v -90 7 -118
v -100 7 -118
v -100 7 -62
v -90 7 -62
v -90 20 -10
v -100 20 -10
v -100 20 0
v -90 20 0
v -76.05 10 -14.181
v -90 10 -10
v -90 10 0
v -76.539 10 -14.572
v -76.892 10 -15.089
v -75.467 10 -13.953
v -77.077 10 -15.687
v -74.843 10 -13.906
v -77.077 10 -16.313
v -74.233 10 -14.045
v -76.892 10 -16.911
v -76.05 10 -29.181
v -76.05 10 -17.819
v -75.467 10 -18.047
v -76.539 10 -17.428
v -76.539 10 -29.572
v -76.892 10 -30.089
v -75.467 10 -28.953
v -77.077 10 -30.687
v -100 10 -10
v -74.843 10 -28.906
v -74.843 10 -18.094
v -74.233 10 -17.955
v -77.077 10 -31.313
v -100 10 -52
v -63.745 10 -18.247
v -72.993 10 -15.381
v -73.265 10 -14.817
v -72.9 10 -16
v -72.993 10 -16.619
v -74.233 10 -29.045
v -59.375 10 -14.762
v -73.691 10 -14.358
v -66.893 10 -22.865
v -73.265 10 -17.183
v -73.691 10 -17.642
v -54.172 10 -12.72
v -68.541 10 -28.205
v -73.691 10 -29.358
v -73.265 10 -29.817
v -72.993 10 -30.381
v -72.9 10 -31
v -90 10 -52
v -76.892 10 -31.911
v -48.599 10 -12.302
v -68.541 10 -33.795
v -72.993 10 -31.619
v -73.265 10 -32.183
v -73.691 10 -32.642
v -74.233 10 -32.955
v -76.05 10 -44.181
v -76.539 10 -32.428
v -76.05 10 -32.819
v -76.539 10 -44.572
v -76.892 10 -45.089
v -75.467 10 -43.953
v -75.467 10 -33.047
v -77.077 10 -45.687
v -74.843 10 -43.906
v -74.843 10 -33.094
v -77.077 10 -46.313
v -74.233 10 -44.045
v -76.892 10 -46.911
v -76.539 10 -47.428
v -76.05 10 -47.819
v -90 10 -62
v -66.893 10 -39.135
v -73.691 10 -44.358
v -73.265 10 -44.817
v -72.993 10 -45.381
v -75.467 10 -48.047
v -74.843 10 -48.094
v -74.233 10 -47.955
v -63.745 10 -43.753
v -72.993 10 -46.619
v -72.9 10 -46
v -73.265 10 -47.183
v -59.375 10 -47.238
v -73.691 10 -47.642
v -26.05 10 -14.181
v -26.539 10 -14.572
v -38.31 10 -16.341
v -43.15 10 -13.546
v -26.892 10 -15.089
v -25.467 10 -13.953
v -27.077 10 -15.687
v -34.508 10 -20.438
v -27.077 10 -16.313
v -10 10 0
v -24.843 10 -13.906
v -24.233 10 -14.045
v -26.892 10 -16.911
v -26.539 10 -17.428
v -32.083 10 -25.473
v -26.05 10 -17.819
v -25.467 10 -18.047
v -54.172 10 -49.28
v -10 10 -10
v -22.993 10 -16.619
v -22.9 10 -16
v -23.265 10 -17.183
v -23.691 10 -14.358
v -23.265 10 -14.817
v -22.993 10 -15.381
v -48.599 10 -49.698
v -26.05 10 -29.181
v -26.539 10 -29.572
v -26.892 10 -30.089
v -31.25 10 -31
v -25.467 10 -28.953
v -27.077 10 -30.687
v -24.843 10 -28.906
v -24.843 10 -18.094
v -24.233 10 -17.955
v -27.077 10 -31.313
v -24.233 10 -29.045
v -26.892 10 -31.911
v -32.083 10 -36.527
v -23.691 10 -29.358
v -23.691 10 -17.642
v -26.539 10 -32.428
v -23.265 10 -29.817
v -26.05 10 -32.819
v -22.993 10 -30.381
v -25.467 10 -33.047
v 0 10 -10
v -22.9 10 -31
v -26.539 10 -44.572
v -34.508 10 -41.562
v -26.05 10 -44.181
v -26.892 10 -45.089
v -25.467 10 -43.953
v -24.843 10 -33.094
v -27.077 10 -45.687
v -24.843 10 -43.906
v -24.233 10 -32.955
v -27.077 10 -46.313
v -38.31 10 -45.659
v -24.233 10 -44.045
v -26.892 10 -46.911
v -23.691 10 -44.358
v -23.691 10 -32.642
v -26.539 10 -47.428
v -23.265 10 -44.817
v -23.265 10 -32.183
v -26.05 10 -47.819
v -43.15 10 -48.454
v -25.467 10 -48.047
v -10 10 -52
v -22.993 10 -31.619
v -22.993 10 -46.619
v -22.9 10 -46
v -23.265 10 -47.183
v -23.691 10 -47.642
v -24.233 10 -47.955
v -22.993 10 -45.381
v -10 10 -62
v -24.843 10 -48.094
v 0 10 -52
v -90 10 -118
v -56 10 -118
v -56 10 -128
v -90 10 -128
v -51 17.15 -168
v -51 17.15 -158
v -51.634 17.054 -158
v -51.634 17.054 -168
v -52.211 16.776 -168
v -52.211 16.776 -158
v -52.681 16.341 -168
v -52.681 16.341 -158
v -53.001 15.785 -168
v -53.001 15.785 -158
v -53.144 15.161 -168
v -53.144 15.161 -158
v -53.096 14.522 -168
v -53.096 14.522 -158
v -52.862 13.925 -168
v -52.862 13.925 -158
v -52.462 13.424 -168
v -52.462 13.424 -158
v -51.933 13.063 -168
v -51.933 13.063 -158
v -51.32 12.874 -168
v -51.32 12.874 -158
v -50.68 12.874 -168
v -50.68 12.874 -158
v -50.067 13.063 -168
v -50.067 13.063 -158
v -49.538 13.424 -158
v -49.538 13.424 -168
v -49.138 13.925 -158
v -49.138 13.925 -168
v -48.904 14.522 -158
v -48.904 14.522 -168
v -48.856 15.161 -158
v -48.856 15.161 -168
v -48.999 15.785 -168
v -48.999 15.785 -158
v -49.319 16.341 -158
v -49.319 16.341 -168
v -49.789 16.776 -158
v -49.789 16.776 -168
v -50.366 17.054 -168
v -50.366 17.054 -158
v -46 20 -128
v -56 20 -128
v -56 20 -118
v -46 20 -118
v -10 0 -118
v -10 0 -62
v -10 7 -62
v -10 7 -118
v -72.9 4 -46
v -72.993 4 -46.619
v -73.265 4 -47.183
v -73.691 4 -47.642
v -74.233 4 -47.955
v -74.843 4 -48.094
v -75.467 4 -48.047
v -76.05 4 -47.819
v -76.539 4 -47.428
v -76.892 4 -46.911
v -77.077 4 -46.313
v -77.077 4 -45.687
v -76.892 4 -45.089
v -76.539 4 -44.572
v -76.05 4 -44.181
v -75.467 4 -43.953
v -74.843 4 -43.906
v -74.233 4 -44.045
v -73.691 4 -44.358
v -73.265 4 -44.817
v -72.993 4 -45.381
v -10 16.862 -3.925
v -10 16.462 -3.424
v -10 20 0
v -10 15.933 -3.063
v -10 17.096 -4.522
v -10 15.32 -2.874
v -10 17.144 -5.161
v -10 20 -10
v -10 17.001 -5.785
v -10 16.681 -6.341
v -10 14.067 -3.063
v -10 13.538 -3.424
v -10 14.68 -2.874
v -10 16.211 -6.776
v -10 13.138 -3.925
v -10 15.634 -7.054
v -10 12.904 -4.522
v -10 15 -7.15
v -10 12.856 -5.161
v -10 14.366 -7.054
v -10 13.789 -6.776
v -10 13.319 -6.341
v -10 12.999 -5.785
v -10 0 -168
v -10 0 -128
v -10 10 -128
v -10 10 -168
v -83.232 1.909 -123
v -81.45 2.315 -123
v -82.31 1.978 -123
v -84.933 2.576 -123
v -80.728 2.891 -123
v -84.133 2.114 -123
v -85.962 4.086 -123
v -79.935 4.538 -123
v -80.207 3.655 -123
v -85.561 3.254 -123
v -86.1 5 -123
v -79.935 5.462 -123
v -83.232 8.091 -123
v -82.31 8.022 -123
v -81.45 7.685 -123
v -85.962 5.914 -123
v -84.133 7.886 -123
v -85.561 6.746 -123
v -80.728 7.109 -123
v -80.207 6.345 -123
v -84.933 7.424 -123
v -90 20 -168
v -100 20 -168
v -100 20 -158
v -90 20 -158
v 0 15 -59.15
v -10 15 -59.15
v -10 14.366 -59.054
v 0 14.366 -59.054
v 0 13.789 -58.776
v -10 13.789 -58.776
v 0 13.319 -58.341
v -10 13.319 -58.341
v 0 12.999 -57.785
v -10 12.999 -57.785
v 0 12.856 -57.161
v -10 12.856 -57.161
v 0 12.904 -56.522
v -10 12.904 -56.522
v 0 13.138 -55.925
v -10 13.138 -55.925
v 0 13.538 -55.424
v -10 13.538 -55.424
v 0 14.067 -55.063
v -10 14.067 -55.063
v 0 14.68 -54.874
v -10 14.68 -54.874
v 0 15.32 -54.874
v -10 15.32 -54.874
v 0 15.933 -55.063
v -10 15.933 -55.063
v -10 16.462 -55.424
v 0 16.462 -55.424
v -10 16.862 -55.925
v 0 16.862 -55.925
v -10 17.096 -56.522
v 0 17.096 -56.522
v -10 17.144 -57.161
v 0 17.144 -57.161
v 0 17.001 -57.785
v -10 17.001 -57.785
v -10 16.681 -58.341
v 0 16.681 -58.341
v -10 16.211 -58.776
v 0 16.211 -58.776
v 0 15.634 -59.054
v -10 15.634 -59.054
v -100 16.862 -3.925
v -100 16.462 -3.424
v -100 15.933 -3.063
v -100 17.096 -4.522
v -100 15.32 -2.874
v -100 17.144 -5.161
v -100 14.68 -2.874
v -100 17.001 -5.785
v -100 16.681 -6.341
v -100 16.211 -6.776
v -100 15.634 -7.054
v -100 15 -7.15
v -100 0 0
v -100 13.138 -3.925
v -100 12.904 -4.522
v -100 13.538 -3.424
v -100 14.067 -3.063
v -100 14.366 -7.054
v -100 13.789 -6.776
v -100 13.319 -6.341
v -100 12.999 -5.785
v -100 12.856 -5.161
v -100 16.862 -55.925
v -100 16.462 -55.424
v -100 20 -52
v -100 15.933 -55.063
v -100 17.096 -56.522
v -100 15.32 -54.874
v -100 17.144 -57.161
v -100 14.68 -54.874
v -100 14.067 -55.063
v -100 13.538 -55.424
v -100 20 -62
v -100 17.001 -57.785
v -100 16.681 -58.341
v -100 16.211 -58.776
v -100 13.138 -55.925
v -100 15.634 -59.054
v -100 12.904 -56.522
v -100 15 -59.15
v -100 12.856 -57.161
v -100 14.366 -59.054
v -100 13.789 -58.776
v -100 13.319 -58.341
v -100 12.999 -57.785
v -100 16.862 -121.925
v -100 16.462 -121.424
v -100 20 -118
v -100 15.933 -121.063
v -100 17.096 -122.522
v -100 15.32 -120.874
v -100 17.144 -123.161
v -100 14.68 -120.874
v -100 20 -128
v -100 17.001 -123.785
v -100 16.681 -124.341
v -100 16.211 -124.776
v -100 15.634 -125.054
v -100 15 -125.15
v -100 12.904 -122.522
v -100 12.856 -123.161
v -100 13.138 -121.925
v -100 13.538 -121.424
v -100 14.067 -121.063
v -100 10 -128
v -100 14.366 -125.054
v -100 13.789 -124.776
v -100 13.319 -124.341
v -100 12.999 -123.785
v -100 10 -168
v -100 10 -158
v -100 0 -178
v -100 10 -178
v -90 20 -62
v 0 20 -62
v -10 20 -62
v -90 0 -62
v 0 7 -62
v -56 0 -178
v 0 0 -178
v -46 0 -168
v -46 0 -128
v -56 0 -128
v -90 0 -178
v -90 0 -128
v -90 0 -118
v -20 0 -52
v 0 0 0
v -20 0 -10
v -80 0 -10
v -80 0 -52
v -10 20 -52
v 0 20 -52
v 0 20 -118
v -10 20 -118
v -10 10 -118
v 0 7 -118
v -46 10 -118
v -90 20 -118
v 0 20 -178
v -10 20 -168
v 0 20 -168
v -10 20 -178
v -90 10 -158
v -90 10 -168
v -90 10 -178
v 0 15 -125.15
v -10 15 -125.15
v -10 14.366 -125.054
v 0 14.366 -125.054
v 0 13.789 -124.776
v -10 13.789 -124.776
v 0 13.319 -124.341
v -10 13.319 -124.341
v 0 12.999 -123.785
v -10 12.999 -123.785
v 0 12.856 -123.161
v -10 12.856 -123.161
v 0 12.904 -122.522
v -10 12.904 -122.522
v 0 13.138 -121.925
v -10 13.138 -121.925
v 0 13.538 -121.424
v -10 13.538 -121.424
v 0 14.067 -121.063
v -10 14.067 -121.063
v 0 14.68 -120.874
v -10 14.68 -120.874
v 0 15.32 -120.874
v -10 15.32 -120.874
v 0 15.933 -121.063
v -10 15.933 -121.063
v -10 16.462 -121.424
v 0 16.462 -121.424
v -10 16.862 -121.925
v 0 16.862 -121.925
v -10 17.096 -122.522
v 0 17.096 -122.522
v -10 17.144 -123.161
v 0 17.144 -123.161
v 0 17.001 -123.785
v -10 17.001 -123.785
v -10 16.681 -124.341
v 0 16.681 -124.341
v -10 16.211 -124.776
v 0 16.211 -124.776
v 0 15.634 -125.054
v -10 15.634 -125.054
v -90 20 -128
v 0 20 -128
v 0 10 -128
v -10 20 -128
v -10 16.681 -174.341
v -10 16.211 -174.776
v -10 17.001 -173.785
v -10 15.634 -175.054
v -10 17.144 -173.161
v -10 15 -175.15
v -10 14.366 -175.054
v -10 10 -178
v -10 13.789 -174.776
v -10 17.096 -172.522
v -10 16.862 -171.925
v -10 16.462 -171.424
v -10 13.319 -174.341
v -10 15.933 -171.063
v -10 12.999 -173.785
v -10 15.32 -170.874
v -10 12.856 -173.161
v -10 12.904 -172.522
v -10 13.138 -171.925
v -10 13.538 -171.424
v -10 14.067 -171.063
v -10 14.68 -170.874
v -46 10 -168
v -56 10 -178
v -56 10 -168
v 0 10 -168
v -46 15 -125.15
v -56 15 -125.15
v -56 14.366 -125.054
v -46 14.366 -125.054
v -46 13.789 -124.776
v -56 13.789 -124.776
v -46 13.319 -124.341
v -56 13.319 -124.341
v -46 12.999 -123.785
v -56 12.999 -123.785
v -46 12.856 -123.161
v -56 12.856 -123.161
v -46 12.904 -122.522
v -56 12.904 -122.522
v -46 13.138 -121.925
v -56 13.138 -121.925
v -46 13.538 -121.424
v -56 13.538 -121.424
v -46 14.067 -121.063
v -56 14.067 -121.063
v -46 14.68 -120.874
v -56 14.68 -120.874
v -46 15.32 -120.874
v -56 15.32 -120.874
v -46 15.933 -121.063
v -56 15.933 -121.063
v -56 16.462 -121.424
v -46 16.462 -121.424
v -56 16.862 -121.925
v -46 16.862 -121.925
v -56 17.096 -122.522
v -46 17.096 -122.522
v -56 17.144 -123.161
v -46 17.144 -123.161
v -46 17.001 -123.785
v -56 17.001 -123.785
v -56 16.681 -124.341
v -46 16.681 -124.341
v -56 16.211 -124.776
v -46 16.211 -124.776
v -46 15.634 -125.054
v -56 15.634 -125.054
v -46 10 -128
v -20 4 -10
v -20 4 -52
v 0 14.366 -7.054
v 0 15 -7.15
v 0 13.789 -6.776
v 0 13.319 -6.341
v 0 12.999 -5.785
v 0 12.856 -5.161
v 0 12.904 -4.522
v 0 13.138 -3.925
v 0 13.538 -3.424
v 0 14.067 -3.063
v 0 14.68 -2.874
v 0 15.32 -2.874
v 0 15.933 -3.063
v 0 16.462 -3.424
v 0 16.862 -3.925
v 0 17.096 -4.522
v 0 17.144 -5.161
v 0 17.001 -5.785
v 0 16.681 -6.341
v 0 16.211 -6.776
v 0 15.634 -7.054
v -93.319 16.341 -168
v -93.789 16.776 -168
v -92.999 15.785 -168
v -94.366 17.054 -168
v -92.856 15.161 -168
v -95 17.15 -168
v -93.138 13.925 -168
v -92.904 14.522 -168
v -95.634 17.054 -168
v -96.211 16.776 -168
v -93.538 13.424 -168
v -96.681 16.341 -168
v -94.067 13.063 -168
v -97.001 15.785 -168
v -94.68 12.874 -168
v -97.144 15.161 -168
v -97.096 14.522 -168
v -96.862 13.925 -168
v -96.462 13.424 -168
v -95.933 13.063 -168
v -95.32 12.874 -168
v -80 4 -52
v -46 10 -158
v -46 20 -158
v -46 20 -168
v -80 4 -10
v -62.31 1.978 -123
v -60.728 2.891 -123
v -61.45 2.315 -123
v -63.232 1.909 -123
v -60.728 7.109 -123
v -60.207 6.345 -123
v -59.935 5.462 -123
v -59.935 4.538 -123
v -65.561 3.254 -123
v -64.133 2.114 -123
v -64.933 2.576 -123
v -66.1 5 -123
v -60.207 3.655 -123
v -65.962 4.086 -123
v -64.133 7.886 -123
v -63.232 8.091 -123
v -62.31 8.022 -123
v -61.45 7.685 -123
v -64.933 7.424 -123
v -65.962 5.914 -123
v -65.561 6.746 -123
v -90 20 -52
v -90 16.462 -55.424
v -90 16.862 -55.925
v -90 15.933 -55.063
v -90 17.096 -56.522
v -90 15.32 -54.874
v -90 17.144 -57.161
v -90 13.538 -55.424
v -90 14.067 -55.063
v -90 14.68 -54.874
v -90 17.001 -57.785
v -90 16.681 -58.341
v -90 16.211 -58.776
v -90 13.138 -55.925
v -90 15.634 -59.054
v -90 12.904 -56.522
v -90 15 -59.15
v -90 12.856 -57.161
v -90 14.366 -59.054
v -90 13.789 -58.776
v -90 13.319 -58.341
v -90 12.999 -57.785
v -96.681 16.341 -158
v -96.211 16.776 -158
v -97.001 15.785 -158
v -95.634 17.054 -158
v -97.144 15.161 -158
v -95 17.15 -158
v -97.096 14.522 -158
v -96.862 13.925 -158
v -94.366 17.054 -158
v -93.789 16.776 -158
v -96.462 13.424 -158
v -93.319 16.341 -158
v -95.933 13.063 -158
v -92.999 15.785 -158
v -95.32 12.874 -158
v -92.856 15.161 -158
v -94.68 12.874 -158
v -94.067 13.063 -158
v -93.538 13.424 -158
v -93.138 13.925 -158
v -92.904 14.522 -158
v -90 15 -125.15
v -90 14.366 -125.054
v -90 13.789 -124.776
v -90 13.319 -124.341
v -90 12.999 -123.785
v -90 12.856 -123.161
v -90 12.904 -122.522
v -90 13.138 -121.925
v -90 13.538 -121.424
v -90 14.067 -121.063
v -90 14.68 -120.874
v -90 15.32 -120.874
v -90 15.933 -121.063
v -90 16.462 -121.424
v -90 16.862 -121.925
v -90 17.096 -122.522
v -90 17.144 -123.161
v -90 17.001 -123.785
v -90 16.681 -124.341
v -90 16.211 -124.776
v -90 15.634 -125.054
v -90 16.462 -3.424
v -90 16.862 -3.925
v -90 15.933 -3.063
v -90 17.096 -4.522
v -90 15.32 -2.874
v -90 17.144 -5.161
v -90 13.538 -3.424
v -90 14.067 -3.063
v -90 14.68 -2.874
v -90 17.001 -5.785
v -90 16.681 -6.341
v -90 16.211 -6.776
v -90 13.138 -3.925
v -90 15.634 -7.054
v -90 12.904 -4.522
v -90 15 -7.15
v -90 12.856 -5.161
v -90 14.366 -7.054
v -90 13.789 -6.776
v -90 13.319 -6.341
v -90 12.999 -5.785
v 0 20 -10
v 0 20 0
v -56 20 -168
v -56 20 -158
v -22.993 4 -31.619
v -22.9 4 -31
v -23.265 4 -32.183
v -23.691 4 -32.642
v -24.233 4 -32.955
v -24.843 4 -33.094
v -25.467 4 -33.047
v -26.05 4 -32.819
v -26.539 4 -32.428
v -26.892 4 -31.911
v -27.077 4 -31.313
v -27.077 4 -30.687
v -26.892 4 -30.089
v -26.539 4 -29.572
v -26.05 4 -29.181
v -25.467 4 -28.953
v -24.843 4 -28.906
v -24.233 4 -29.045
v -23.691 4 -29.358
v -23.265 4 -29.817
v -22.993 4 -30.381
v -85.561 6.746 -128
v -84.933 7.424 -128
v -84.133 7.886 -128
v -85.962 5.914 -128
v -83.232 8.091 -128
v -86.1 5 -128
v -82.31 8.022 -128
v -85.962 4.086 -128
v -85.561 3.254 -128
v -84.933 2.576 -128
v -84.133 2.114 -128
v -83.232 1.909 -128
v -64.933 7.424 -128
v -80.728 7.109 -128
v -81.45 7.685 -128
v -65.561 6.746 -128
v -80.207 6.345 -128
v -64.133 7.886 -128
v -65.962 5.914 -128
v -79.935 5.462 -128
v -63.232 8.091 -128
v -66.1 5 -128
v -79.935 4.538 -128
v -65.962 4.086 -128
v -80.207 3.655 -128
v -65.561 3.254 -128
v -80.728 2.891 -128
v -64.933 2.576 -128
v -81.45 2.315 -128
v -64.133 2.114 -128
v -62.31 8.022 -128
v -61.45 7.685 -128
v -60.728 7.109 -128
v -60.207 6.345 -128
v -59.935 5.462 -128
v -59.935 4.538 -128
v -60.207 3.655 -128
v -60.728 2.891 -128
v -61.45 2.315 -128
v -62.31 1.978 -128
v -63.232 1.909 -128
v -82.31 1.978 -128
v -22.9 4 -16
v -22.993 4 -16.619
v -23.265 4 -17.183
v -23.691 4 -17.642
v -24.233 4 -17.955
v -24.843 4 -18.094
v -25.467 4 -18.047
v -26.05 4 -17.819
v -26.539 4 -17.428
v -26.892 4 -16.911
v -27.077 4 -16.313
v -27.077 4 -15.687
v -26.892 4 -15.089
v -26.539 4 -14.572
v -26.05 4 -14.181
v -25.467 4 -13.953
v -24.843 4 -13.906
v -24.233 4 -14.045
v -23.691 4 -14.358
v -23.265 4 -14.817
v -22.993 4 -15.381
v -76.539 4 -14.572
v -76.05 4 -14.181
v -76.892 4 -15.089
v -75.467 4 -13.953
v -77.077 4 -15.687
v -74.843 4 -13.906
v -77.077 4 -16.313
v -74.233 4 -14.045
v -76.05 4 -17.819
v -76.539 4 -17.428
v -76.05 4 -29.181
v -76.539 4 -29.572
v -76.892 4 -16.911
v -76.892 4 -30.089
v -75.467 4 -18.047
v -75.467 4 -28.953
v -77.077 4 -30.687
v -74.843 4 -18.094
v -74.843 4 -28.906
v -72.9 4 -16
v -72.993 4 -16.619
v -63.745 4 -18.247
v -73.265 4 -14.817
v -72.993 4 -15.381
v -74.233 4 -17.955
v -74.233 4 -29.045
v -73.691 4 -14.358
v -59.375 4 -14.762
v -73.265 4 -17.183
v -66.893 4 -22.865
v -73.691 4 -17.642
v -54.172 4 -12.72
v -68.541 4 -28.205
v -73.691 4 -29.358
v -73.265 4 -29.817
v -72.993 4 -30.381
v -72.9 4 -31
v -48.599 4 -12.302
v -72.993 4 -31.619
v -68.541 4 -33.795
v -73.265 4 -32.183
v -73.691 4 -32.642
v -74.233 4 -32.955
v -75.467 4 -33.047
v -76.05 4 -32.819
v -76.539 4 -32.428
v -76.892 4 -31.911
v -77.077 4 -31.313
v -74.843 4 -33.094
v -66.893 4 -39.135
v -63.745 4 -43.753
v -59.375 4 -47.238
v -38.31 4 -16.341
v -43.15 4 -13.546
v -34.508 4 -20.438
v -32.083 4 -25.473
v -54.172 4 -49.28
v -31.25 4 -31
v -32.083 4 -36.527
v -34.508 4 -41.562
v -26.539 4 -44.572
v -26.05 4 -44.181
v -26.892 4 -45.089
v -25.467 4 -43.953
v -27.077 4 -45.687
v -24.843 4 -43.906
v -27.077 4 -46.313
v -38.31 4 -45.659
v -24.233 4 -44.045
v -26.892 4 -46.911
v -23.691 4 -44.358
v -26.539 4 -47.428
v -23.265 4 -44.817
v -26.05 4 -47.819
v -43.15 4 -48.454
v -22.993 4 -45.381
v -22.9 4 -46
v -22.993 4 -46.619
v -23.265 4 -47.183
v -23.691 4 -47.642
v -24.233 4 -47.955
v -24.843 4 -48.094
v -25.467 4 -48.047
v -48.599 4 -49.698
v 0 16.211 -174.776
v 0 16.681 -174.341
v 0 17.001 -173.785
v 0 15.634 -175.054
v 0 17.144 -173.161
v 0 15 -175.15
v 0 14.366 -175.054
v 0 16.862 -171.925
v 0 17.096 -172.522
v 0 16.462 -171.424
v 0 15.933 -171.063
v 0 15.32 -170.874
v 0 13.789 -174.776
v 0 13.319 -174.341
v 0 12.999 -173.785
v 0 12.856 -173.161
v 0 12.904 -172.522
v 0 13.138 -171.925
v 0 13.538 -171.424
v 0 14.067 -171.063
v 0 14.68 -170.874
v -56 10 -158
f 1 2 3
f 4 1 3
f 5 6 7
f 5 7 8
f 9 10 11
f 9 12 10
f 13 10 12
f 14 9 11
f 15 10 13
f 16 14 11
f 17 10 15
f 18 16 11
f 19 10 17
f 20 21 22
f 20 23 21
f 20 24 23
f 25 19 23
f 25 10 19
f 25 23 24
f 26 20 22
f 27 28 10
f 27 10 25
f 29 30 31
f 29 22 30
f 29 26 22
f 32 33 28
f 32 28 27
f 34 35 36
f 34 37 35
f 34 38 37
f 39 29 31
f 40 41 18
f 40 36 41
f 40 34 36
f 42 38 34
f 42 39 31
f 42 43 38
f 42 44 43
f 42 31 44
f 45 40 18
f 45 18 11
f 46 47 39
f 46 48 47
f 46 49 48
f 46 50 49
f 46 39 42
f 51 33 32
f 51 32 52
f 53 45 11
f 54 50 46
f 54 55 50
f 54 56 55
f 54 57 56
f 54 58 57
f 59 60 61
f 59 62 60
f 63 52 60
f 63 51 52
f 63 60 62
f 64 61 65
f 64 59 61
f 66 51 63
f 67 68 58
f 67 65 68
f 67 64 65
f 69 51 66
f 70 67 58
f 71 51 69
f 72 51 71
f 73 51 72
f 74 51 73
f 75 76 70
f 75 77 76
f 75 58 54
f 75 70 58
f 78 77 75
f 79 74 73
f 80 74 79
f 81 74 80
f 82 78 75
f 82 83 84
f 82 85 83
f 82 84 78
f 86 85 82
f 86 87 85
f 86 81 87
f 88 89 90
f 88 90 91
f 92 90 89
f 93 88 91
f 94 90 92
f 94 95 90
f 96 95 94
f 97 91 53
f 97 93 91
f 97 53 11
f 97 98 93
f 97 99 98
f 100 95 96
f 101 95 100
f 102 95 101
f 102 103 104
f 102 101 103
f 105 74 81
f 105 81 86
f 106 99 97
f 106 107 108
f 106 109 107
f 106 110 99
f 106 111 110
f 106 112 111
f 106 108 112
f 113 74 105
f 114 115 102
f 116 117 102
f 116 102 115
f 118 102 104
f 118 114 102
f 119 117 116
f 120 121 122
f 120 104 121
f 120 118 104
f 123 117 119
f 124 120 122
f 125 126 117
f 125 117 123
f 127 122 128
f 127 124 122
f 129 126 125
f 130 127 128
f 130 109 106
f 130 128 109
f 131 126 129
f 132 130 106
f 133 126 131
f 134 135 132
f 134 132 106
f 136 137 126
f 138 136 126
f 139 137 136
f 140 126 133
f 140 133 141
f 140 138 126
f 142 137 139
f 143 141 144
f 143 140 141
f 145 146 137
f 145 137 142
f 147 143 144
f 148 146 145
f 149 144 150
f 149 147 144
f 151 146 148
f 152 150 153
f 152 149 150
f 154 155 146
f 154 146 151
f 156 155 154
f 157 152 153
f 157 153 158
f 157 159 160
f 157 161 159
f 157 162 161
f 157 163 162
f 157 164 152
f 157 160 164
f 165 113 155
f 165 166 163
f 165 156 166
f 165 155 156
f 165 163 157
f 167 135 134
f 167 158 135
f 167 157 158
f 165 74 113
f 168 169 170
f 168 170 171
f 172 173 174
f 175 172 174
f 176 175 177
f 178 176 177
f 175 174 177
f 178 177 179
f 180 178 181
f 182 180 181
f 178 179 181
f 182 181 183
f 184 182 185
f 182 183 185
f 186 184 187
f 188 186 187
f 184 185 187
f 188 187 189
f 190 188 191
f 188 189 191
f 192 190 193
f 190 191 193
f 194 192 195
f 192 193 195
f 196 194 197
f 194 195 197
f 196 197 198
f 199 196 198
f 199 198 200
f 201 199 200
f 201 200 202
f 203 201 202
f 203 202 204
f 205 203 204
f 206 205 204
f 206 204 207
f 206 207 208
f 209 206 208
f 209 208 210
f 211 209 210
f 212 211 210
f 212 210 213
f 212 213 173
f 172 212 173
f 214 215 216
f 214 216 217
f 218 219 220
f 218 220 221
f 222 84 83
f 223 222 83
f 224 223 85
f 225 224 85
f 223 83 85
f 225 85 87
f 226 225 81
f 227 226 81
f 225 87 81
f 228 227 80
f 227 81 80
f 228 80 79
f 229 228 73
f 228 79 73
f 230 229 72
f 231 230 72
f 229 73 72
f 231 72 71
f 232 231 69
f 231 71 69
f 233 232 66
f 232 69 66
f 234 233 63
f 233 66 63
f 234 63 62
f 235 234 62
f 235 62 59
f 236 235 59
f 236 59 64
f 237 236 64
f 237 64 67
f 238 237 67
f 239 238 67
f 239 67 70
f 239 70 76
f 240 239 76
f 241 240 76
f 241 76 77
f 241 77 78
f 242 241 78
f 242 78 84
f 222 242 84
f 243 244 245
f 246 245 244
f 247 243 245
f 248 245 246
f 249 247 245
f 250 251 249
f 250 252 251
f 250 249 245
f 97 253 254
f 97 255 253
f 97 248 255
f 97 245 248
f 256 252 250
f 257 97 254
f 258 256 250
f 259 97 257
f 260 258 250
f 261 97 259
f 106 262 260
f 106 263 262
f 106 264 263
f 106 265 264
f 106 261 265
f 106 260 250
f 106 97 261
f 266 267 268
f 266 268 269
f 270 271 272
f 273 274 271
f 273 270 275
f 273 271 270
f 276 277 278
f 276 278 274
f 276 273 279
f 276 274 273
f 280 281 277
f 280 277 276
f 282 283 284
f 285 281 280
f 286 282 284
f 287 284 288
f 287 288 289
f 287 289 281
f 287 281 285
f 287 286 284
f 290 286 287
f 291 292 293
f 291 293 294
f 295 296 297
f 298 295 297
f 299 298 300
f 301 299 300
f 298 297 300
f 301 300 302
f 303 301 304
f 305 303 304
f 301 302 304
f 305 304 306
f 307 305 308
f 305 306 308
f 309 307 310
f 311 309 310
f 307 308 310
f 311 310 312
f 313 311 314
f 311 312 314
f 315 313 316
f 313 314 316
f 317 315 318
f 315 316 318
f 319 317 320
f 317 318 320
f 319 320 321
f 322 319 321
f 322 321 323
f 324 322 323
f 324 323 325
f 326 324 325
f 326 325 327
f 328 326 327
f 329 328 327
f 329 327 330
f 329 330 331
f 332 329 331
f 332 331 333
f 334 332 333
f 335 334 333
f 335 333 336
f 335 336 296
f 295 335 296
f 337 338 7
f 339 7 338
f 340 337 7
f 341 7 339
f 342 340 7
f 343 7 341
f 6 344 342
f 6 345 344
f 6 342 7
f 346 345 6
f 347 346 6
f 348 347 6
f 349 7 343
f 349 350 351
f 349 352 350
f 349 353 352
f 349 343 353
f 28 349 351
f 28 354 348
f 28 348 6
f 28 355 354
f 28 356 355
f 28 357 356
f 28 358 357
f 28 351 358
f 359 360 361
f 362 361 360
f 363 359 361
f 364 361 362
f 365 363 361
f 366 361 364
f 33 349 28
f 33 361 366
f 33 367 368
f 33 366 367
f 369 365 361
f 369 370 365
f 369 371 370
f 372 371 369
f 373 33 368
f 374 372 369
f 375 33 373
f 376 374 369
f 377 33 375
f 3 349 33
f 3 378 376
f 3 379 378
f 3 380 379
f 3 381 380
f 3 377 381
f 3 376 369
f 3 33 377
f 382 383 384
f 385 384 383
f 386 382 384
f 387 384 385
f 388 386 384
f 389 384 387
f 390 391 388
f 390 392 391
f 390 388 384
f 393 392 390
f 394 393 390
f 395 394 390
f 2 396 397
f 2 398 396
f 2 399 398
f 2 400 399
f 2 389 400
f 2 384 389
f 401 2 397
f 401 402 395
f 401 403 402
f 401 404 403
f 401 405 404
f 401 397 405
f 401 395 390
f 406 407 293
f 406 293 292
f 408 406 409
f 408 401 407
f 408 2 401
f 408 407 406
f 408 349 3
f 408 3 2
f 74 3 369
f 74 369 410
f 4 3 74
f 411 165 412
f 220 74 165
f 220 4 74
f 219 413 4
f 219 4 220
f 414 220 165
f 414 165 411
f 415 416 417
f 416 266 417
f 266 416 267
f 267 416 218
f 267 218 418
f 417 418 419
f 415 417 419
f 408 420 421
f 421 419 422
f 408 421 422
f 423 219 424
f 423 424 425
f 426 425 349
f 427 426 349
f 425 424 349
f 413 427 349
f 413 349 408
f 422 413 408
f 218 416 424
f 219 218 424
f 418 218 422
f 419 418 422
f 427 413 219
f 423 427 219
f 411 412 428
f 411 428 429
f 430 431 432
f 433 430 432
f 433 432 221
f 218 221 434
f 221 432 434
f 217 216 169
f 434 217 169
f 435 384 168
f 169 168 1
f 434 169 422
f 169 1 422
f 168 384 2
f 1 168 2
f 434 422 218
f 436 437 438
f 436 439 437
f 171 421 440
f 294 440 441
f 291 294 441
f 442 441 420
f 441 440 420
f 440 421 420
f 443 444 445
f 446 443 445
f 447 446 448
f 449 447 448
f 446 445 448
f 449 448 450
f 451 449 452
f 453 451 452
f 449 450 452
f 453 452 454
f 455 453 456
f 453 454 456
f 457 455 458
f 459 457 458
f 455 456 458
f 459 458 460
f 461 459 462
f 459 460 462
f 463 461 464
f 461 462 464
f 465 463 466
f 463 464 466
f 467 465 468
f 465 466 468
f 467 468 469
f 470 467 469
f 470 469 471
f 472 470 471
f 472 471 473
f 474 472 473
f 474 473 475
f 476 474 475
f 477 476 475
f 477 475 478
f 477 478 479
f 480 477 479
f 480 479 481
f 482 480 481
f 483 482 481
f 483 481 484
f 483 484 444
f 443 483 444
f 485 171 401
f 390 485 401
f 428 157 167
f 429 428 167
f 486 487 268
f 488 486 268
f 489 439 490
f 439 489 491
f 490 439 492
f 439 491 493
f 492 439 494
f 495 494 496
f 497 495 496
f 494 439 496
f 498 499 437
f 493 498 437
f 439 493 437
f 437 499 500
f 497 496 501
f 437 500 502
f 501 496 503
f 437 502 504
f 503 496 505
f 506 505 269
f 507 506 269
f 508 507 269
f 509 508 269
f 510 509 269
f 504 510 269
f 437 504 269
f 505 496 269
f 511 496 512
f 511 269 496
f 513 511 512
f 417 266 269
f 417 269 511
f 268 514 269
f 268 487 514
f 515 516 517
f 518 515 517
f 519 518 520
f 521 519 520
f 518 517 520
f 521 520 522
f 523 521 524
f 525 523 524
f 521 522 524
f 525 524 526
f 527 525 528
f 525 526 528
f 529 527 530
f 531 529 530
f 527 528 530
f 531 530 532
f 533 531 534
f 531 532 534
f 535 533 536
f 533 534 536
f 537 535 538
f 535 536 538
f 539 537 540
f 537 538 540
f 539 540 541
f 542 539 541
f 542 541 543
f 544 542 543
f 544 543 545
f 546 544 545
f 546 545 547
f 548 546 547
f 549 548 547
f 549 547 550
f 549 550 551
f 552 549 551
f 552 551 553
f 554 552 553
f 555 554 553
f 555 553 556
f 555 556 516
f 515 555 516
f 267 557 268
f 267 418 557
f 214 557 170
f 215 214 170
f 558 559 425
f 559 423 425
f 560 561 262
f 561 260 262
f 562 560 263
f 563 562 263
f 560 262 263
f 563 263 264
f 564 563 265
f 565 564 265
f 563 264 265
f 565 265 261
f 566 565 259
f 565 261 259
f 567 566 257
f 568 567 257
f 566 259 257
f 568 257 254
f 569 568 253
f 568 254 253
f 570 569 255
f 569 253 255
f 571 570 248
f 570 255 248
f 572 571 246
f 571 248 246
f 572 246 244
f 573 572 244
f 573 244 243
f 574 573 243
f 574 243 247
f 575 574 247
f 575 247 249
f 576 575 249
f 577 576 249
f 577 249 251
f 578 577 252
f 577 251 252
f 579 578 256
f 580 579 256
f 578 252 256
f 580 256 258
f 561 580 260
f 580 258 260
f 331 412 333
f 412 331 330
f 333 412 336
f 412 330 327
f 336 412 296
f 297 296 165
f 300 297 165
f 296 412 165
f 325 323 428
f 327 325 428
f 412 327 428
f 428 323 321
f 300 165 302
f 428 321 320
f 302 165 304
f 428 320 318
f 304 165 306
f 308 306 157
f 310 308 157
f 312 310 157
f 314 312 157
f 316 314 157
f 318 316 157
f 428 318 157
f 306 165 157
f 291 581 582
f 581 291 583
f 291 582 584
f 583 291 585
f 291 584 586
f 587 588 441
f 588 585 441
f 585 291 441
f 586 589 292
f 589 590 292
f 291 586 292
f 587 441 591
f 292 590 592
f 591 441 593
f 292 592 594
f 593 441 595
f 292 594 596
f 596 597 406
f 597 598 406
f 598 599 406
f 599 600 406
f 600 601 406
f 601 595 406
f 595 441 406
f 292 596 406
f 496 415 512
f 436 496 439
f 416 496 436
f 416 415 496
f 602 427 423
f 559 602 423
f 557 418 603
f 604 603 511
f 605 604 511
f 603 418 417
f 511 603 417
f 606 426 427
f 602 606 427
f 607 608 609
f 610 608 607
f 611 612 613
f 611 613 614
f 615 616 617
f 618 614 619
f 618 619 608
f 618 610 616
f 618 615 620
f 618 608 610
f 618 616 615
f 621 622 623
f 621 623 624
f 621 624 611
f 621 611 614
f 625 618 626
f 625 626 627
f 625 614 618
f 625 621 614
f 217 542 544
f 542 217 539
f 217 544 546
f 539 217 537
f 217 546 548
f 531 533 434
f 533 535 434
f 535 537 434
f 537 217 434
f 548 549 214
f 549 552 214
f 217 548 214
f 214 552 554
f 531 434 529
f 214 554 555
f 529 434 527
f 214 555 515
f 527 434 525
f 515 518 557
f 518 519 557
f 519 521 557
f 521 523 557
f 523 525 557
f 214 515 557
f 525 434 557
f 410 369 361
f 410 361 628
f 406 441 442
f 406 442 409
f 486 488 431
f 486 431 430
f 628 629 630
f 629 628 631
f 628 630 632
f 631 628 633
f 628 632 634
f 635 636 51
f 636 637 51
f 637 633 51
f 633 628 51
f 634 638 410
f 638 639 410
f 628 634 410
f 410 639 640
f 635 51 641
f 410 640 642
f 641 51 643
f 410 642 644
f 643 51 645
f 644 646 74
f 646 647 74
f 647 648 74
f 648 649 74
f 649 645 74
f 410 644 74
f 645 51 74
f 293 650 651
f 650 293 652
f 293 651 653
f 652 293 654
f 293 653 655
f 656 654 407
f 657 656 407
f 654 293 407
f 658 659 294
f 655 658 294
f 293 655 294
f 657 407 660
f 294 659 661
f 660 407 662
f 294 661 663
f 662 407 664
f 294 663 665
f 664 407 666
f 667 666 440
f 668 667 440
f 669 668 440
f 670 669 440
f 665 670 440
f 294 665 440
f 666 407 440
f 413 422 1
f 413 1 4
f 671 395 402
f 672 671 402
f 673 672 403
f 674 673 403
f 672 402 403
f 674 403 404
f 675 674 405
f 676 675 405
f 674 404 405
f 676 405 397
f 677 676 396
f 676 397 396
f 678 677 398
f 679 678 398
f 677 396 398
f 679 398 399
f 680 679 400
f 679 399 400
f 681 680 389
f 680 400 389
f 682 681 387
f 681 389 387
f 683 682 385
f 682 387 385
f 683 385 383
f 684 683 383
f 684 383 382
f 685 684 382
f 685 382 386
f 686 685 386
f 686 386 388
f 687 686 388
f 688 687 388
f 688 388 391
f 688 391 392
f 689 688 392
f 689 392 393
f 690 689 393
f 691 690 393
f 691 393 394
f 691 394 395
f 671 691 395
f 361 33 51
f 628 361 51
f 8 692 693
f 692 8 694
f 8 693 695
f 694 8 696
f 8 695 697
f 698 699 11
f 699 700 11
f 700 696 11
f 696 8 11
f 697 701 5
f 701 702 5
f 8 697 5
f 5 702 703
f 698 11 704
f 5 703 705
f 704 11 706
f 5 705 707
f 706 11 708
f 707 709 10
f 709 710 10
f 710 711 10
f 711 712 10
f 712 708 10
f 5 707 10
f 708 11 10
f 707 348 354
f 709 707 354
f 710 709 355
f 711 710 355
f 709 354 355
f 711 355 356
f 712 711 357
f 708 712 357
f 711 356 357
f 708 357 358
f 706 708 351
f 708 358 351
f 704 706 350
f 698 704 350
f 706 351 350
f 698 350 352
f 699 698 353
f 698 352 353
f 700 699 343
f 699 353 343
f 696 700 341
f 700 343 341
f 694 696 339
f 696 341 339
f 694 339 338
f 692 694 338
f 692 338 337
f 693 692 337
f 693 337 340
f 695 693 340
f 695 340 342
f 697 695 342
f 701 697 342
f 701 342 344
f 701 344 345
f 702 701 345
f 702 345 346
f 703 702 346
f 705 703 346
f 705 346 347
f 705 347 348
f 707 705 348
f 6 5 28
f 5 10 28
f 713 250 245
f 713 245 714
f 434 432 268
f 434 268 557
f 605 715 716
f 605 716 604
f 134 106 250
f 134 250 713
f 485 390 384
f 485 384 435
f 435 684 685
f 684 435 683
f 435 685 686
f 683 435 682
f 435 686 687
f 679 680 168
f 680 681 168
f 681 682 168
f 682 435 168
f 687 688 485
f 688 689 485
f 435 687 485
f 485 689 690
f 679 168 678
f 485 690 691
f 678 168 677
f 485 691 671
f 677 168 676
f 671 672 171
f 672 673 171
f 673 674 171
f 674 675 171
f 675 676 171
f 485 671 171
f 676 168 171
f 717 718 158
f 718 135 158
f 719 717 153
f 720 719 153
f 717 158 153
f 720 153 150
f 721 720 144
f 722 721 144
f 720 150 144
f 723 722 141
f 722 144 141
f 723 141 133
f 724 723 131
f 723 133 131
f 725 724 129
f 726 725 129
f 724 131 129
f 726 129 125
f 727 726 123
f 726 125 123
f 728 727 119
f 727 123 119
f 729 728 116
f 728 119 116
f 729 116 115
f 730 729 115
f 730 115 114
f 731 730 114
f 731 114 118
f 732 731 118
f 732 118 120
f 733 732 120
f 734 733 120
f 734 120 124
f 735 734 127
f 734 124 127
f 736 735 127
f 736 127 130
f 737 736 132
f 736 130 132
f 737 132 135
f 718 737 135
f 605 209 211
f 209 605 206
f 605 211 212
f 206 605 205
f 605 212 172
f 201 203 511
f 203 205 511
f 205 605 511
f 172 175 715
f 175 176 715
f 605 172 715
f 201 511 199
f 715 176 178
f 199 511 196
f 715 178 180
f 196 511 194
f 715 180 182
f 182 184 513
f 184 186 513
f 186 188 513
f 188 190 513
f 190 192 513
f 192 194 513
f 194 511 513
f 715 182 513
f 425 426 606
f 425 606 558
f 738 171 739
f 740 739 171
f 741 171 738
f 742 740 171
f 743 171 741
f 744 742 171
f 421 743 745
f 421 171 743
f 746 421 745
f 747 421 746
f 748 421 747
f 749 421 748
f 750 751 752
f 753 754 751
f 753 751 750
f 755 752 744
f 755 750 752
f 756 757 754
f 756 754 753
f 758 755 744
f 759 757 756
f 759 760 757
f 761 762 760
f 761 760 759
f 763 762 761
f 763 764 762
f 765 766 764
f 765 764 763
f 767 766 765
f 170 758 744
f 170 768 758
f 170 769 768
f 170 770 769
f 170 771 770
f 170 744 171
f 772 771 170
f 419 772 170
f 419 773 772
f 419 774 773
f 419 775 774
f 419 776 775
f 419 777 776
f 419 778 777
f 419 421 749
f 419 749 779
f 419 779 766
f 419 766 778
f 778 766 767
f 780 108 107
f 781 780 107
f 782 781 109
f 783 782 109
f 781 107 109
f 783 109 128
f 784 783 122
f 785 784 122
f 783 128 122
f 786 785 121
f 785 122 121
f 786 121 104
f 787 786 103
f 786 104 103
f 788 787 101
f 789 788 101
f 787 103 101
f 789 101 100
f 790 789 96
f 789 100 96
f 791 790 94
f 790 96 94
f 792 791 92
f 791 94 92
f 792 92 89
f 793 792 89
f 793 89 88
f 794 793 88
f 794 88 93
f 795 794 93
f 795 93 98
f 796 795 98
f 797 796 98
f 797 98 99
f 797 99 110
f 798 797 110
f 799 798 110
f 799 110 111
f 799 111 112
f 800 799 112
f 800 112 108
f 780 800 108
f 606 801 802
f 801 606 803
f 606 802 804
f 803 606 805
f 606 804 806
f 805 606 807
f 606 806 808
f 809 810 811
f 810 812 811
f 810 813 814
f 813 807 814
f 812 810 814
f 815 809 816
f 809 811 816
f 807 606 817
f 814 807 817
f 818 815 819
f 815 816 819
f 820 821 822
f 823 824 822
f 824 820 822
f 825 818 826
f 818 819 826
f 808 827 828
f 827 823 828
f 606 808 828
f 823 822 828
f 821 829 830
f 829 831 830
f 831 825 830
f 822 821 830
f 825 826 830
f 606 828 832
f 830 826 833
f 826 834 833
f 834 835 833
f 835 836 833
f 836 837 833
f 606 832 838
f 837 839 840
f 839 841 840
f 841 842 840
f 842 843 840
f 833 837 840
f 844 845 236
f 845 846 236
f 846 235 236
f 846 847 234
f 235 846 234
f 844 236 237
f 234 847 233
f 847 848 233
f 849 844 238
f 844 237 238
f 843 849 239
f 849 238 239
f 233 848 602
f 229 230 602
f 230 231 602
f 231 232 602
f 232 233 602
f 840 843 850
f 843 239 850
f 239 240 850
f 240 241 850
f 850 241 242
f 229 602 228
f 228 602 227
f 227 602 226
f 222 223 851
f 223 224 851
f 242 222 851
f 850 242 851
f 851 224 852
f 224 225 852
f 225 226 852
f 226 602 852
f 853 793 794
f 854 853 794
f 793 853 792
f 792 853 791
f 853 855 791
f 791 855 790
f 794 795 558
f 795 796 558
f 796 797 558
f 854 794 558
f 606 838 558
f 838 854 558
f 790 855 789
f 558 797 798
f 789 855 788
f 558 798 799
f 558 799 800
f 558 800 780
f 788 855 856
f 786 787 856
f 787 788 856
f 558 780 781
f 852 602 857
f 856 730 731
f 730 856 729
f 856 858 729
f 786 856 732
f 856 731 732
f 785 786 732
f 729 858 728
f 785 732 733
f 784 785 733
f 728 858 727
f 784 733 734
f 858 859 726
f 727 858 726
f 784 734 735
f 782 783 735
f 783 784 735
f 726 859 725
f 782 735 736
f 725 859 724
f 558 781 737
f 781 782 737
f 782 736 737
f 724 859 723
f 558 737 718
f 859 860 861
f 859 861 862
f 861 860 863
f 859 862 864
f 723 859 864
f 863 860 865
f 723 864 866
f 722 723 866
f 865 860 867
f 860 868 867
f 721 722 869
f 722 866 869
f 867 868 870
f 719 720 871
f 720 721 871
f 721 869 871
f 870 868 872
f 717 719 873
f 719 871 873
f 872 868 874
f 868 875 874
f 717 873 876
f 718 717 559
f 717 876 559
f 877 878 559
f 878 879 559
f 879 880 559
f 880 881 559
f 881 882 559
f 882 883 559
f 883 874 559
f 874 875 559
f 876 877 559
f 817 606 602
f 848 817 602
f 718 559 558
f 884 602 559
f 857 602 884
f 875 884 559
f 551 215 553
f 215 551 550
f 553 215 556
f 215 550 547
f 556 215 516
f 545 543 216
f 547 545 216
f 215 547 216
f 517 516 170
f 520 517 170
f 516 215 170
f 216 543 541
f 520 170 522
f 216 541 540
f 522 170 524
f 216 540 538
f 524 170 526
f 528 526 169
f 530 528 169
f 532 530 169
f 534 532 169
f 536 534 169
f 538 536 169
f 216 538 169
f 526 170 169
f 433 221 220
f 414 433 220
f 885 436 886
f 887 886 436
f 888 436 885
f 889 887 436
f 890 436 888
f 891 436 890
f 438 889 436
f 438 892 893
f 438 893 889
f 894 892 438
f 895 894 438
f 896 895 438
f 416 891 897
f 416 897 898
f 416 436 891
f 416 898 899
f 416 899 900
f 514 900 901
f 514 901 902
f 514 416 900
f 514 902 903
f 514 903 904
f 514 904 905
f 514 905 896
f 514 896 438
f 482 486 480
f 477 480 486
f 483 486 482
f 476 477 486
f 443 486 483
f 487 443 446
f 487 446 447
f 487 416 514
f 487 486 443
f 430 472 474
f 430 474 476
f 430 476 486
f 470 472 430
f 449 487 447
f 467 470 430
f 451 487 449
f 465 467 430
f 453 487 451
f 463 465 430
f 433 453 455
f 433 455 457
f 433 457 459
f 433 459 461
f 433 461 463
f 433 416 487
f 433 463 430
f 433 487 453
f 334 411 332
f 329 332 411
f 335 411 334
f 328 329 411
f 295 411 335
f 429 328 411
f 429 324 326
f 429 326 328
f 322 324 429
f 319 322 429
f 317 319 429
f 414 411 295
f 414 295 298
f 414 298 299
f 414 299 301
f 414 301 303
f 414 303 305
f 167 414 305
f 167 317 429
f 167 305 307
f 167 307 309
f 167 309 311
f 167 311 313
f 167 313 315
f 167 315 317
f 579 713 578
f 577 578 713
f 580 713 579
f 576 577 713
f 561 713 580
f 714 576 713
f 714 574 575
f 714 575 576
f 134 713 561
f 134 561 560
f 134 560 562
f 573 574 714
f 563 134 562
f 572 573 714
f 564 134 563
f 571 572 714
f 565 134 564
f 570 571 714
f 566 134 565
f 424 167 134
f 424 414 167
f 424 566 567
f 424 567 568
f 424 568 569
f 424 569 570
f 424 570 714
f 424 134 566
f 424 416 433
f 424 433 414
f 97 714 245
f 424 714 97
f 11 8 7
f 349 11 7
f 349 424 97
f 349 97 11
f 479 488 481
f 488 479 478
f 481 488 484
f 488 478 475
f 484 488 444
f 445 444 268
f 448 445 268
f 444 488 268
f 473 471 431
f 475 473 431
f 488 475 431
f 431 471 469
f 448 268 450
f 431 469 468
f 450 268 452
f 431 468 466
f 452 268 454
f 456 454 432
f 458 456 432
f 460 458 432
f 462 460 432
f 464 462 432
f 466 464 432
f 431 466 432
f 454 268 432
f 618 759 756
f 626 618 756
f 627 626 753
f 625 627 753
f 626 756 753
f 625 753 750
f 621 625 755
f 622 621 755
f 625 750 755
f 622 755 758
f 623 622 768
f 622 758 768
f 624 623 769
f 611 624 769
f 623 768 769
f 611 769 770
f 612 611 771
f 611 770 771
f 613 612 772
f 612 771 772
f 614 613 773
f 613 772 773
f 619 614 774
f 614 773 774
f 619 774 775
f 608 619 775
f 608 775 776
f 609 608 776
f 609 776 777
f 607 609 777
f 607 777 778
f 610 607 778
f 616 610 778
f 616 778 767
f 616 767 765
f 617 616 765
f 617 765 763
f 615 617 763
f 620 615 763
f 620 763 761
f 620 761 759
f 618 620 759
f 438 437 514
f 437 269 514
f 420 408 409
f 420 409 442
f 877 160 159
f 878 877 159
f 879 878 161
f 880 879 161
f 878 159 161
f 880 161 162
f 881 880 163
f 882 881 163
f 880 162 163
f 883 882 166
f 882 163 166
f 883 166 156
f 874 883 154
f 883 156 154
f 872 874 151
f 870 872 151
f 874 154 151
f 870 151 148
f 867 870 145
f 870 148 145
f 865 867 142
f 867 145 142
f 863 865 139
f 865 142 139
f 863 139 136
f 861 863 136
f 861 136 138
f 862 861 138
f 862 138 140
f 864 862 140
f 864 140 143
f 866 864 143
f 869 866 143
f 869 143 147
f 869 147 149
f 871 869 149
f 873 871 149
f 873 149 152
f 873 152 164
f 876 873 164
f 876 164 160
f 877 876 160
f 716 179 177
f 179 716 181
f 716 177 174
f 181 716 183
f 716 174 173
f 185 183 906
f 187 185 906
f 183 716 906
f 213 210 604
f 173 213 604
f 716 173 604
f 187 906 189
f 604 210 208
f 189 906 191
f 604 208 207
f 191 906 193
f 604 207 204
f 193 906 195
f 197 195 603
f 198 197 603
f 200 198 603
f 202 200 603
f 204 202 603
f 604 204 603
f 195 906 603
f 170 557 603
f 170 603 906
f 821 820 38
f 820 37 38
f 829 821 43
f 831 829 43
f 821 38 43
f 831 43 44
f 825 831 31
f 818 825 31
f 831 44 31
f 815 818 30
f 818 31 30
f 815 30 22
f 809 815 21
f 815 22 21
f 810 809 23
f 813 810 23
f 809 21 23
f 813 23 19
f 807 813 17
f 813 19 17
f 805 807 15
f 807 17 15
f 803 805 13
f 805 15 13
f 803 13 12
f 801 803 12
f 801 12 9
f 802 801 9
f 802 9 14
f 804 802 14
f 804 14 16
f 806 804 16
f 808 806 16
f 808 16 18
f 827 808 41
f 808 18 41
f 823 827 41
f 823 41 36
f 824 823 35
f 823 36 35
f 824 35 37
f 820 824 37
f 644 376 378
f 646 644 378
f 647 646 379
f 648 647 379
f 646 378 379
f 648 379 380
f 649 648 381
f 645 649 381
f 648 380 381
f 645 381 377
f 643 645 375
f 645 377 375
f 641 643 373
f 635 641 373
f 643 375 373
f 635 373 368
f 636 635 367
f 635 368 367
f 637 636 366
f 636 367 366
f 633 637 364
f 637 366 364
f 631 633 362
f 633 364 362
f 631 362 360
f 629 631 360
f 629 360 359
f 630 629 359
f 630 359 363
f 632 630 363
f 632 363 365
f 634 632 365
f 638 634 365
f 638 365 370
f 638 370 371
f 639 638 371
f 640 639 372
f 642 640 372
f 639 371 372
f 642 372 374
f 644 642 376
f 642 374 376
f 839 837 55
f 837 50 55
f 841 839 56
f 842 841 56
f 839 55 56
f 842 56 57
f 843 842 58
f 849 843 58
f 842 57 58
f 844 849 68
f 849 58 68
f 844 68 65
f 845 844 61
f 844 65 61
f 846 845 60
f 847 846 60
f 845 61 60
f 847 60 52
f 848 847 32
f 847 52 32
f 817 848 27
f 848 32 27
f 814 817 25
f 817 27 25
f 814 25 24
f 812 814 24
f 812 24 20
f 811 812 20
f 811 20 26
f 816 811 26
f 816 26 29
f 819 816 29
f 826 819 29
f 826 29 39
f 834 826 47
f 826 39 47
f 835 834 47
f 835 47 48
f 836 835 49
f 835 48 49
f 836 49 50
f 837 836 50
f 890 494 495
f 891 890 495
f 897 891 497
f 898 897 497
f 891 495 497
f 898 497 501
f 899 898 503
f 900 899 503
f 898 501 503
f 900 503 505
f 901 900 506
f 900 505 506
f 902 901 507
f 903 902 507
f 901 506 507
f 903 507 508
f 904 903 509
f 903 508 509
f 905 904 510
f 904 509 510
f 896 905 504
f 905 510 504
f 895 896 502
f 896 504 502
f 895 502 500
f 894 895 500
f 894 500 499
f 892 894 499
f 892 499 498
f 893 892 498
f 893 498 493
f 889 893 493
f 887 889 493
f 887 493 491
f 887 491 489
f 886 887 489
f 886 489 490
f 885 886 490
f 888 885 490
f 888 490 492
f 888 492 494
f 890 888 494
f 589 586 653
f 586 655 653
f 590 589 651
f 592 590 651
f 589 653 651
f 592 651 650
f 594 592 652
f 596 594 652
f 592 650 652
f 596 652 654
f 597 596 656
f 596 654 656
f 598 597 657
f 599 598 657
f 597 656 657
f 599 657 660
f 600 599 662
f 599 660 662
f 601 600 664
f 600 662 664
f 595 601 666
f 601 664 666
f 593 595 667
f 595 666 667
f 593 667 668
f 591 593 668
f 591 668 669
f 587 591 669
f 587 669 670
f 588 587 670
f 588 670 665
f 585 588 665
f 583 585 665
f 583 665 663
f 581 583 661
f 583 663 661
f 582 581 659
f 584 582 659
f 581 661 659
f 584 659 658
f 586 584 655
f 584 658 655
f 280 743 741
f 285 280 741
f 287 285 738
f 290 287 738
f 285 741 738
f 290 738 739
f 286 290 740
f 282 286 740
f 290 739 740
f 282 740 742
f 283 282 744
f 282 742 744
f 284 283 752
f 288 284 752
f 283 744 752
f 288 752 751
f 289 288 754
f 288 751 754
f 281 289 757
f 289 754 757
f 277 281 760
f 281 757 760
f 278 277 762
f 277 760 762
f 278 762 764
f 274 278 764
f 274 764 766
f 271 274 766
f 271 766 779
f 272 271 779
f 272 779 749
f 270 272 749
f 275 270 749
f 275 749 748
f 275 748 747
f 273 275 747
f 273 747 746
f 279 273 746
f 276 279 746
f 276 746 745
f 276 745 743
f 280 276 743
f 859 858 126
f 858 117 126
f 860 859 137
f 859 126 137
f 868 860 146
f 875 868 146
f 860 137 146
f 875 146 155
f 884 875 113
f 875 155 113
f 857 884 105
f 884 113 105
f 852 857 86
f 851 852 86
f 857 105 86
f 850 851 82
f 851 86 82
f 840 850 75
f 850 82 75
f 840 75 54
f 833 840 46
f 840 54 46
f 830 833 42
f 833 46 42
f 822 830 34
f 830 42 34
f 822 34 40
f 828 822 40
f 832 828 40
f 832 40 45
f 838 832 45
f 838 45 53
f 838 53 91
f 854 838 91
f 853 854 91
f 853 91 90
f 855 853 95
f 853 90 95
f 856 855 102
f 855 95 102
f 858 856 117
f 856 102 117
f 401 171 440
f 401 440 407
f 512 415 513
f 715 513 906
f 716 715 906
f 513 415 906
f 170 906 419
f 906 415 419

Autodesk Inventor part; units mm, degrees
ref_plane "YZ Plane" through (0, 0, 0) normal (1, 0, 0) x (0, 1, 0)
ref_plane "XZ Plane" through (0, 0, 0) normal (0, 1, 0) x (-1, 0, 0)
ref_plane "XY Plane" through (0, 0, 0) normal (0, 0, 1) x (1, 0, 0)
sketch "Sketch1" plane through (0, 0, 0) normal (0, 1, 0) x (-1, 0, 0)
  line L0 (0, 0) -> (100, 0)
  line L1 (100, 0) -> (100, -178)
  line L2 (0, -178) -> (0, 0)
  line L3 (90, -10) -> (10, -10)
  line L4 (90, -52) -> (10, -52)
  line L5 (90, -62) -> (10, -62)
  line L6 (90, -52) -> (90, -10)
  line L7 (10, -10) -> (10, -52)
  line L8 (90, -118) -> (10, -118)
  line L9 (90, -168) -> (90, -128)
  line L10 (90, -118) -> (90, -62)
  line L11 (10, -62) -> (10, -118)
  line L12 (10, -128) -> (10, -168)
  line L13 (100, -178) -> (90, -178)
  line L14 (10, -178) -> (0, -178)
  line L15 (90, -168) -> (90, -178)
  line L16 (10, -168) -> (46, -168)
  line L17 (56, -168) -> (56, -178)
  line L18 (56, -178) -> (10, -178)
  line L19 (56, -168) -> (56, -128)
  line L20 (46, -128) -> (46, -168)
  line L21 (90, -128) -> (56, -128)
  line L22 (46, -128) -> (10, -128)
  dimension "thickness" = 10
  dimension "d3" = 10
  dimension "d4" = 10
  dimension "d8" = 10
  dimension "motor" = 42
  dimension "d10" = 10
  dimension "d11" = 10
  dimension "d27" = 10
  dimension "batterywidth" = 56
  dimension "d31" = 80
  dimension "suspensionWidth" = 40
  dimension "d33" = 10
  dimension "d34" = 10
  dimension "suspensionHeight" = 34
  dimension "d36" = 10
  dimension "d38" = 10
  dimension "d39" = 40
  dimension "d40" = 40
  dimension "d41" = 36
extrude "Extrusion2" add sketch "Sketch1" along normal blind 10
sketch "Sketch2" plane through (0, 10, 0) normal (0, 1, 0) x (1, 0, 0)
  line L0 (-100, 0) -> (-90, 0)
  line L1 (-90, 0) -> (-90, 10)
  line L2 (-90, 10) -> (-100, 10)
  line L3 (-100, 10) -> (-100, 0)
  line L4 (-10, 52) -> (-10, 10) projected
  line L5 (0, 0) -> (-10, 0)
  line L6 (-10, 0) -> (-10, 10)
  line L7 (-10, 10) -> (0, 10)
  line L8 (0, 10) -> (0, 0)
  line L9 (-100, 178) -> (-100, 0) projected
  line L10 (-100, 0) -> (0, 0) projected
  line L11 (-100, 52) -> (-90, 52)
  line L12 (-90, 52) -> (-90, 62)
  line L13 (-90, 62) -> (-100, 62)
  line L14 (-100, 62) -> (-100, 52)
  line L15 (-90, 52) -> (-10, 52) projected
  line L16 (-10, 52) -> (0, 52)
  line L17 (0, 52) -> (0, 62)
  line L18 (0, 62) -> (-10, 62)
  line L19 (-10, 62) -> (-10, 52)
  line L20 (-90, 10) -> (-90, 52) projected
  line L21 (-100, 118) -> (-90, 118)
  line L22 (-90, 118) -> (-90, 128)
  line L23 (-90, 128) -> (-100, 128)
  line L24 (-100, 128) -> (-100, 118)
  line L25 (-56, 128) -> (-90, 128) projected
  line L26 (-56, 118) -> (-46, 118)
  line L27 (-46, 118) -> (-46, 128)
  line L28 (-46, 128) -> (-56, 128)
  line L29 (-56, 128) -> (-56, 118)
  line L30 (-90, 118) -> (-10, 118) projected
  line L31 (0, 178) -> (-56, 178) projected
  line L32 (-10, 168) -> (0, 168)
  line L33 (0, 168) -> (0, 178)
  line L34 (0, 178) -> (-10, 178)
  line L35 (-10, 178) -> (-10, 168)
  line L36 (0, 0) -> (0, 178) projected
  line L37 (-10, 118) -> (0, 118)
  line L38 (0, 118) -> (0, 128)
  line L39 (0, 128) -> (-10, 128)
  line L40 (-10, 128) -> (-10, 118)
  line L41 (-10, 128) -> (-46, 128) projected
  line L42 (-56, 158) -> (-46, 158)
  line L43 (-46, 158) -> (-46, 168)
  line L44 (-46, 168) -> (-56, 168)
  line L45 (-56, 168) -> (-56, 158)
  line L46 (-46, 168) -> (-10, 168) projected
  line L47 (-46, 128) -> (-46, 168) projected
  line L48 (-100, 158) -> (-90, 158)
  line L49 (-90, 158) -> (-90, 168)
  line L50 (-90, 168) -> (-100, 168)
  line L51 (-100, 168) -> (-100, 158)
  line L52 (-90, 128) -> (-90, 178) projected
  dimension "d36" = 10
  dimension "d44" = 10
  dimension "d45" = 10
  dimension "d47" = 10
  dimension "d50" = 10
  dimension "d51" = 10
  dimension "d52" = 10
  dimension "d53" = 10
  dimension "d58" = 10
  dimension "d64" = 10
  dimension "d65" = 10
  dimension "d148" = 10
  dimension "d149" = 10
  dimension "d150" = 10
  dimension "d151" = 10
extrude "Extrusion3" add sketch "Sketch2" along normal blind 10 contours L3 L2 L1 L0 | L6 L7 L8 L5 | L9 L13 L12 L11 | L19 L18 L17 L16 | L9 L23 L22 L21 | L9 L50 L49 L48 | L29 L28 L27 L26 | L37 L40 L39 L36 | L32 L35 L31 L33 | L42 L45 L44 L43
sketch "Sketch6" plane through (0, 0, 0) normal (0, -1, 0) x (1, 0, 0)
  line L0 (-90, -10) -> (-80, -10)
  line L1 (-80, -10) -> (-80, -52)
  line L2 (-80, -52) -> (-90, -52)
  line L3 (-90, -52) -> (-90, -10)
  line L4 (-90, -52) -> (-90, -10) projected
  line L5 (-90, -10) -> (-10, -10) projected
  line L6 (-10, -52) -> (-90, -52) projected
  line L7 (-20, -10) -> (-10, -10)
  line L8 (-10, -10) -> (-10, -52)
  line L9 (-10, -52) -> (-20, -52)
  line L10 (-20, -52) -> (-20, -10)
  line L11 (-10, -10) -> (-10, -52) projected
  point P0 (0, 0)
  dimension "motorFixtureHeight" = 60
  dimension "d72" = 10
extrude "Extrusion5" add sketch "Sketch6" against normal blind 10 contours L0 L1 L2 L3 | L5 L8 L6 L10
sketch "Sketch7" plane through (0, 10, 0) normal (0, 1, 0) x (1, 0, 0)
  line L0 (-80, 10) -> (-20, 10)
  line L1 (-20, 10) -> (-20, 52)
  line L2 (-20, 52) -> (-80, 52)
  line L3 (-80, 52) -> (-80, 10)
  line L4 (-80, 10) -> (-80, 52) projected
  line L5 (-80, 52) -> (-20, 52) projected
  line L6 (-20, 52) -> (-20, 10) projected
  line L7 (-20, 10) -> (-80, 10) projected
  circle A0 centre (-50, 31) radius 18.75
  circle A1 centre (-75, 16) radius 2.1
  circle A2 centre (-25, 31) radius 2.1
  circle A3 centre (-75, 46) radius 2.1
  circle A4 centre (-25, 16) radius 2.1
  circle A5 centre (-25, 46) radius 2.1
  circle A6 centre (-75, 31) radius 2.1
  point P0 (0, 0)
  dimension "d75" = 37.5
  dimension "d77" = 21
  dimension "d78" = 30
  dimension "d79" = 4.2
  dimension "d80" = 4.2
  dimension "d82" = 4.2
  dimension "d83" = 4.2
  dimension "d84" = 4.2
  dimension "d85" = 4.2
  dimension "d86" = 25
  dimension "d87" = 0
  dimension "d88" = 25
  dimension "d89" = 15
  dimension "d90" = 25
  dimension "d91" = 15
  dimension "d92" = 15
  dimension "d93" = 25
  dimension "d94" = 25
  dimension "d95" = 0
  dimension "d96" = 25
  dimension "d97" = 15
extrude "Extrusion6" add sketch "Sketch7" against normal blind 6
hole "Hole2" at (0, 15, -173) direction (-1, 0, 0) diameter 4.3 end through all
hole "Hole3" at (0, 15, -123) direction (-1, 0, 0) diameter 4.3 end through all
hole "Hole4" at (0, 15, -57) direction (-1, 0, 0) diameter 4.3 end through all
hole "Hole5" at (0, 15, -5) direction (-1, 0, 0) diameter 4.3 end through all
sketch "Sketch8" plane through (-100, 0, -178) normal (-1, 0, 0) x (0, 0, 1)
  line L0 (116, 10) -> (60, 10)
  line L1 (60, 10) -> (60, 7)
  line L2 (60, 7) -> (116, 7)
  line L3 (116, 7) -> (116, 10)
  line L4 (116, 10) -> (60, 7) construction
  line L5 (60, 10) -> (116, 7) construction
  line L6 (60, 10) -> (116, 10) projected
  line L7 (60, 10) -> (60, 20) projected
  line L8 (116, 10) -> (116, 20) projected
  point P0 (178, 0)
  point P1 (88, 8.5)
  dimension "d145" = 3
extrude "Extrusion7" cut sketch "Sketch8" against normal up to surface (100 mm away)
hole "Hole6" at (-95, 15, -168) direction (0, 0, 1) diameter 4.3 depth 10 tip angle 118
hole "Hole7" at (-51, 15, -168) direction (0, 0, 1) diameter 4.3 depth 10 tip angle 118
sketch "Sketch9" plane through (-56, 0, -128) normal (0, 0, -1) x (-1, 0, 0)
  circle A0 centre (27, 5) radius 3.1
  circle A1 centre (7, 5) radius 3.1
  line L0 (34, 0) -> (0, 0) projected
  line L1 (0, 0) -> (0, 10) projected
  line L2 (34, 0) -> (34, 10) projected
  point P0 (-56, 0)
  dimension "d170" = 6.2
  dimension "d171" = 6.2
  dimension "d172" = 5
  dimension "d173" = 5
  dimension "d174" = 7
  dimension "d175" = 7
extrude "Extrusion8" cut sketch "Sketch9" against normal blind 5
equation "\"d3\" = thickness"
equation "\"d4\" = thickness"
equation "\"d8\" = thickness"
equation "\"d10\" = thickness"
equation "\"d11\" = thickness"
equation "\"d27\" = thickness"
equation "\"d33\" = thickness"
equation "\"d34\" = thickness"
equation "\"d36\" = thickness"
equation "\"d38\" = thickness"
equation "\"d39\" = suspensionWidth"
equation "\"d40\" = suspensionWidth"
equation "\"d42\" = thickness"
equation "\"d44\" = thickness"
equation "\"d50\" = thickness"
equation "\"d51\" = thickness"
equation "\"d52\" = thickness"
equation "\"d53\" = thickness"
equation "\"d58\" = thickness"
equation "\"d64\" = thickness"
equation "\"d65\" = thickness"
equation "\"d148\" = thickness"
equation "\"d149\" = thickness"
equation "\"d150\" = thickness"
equation "\"d151\" = thickness"
equation "\"d66\" = thickness"
equation "\"d73\" = thickness"
equation "\"d77\" = 0.5 * motor"
equation "\"d159\" = thickness"
equation "\"d168\" = thickness"
properties part number "sideFrame" material "ABS Plastic"
